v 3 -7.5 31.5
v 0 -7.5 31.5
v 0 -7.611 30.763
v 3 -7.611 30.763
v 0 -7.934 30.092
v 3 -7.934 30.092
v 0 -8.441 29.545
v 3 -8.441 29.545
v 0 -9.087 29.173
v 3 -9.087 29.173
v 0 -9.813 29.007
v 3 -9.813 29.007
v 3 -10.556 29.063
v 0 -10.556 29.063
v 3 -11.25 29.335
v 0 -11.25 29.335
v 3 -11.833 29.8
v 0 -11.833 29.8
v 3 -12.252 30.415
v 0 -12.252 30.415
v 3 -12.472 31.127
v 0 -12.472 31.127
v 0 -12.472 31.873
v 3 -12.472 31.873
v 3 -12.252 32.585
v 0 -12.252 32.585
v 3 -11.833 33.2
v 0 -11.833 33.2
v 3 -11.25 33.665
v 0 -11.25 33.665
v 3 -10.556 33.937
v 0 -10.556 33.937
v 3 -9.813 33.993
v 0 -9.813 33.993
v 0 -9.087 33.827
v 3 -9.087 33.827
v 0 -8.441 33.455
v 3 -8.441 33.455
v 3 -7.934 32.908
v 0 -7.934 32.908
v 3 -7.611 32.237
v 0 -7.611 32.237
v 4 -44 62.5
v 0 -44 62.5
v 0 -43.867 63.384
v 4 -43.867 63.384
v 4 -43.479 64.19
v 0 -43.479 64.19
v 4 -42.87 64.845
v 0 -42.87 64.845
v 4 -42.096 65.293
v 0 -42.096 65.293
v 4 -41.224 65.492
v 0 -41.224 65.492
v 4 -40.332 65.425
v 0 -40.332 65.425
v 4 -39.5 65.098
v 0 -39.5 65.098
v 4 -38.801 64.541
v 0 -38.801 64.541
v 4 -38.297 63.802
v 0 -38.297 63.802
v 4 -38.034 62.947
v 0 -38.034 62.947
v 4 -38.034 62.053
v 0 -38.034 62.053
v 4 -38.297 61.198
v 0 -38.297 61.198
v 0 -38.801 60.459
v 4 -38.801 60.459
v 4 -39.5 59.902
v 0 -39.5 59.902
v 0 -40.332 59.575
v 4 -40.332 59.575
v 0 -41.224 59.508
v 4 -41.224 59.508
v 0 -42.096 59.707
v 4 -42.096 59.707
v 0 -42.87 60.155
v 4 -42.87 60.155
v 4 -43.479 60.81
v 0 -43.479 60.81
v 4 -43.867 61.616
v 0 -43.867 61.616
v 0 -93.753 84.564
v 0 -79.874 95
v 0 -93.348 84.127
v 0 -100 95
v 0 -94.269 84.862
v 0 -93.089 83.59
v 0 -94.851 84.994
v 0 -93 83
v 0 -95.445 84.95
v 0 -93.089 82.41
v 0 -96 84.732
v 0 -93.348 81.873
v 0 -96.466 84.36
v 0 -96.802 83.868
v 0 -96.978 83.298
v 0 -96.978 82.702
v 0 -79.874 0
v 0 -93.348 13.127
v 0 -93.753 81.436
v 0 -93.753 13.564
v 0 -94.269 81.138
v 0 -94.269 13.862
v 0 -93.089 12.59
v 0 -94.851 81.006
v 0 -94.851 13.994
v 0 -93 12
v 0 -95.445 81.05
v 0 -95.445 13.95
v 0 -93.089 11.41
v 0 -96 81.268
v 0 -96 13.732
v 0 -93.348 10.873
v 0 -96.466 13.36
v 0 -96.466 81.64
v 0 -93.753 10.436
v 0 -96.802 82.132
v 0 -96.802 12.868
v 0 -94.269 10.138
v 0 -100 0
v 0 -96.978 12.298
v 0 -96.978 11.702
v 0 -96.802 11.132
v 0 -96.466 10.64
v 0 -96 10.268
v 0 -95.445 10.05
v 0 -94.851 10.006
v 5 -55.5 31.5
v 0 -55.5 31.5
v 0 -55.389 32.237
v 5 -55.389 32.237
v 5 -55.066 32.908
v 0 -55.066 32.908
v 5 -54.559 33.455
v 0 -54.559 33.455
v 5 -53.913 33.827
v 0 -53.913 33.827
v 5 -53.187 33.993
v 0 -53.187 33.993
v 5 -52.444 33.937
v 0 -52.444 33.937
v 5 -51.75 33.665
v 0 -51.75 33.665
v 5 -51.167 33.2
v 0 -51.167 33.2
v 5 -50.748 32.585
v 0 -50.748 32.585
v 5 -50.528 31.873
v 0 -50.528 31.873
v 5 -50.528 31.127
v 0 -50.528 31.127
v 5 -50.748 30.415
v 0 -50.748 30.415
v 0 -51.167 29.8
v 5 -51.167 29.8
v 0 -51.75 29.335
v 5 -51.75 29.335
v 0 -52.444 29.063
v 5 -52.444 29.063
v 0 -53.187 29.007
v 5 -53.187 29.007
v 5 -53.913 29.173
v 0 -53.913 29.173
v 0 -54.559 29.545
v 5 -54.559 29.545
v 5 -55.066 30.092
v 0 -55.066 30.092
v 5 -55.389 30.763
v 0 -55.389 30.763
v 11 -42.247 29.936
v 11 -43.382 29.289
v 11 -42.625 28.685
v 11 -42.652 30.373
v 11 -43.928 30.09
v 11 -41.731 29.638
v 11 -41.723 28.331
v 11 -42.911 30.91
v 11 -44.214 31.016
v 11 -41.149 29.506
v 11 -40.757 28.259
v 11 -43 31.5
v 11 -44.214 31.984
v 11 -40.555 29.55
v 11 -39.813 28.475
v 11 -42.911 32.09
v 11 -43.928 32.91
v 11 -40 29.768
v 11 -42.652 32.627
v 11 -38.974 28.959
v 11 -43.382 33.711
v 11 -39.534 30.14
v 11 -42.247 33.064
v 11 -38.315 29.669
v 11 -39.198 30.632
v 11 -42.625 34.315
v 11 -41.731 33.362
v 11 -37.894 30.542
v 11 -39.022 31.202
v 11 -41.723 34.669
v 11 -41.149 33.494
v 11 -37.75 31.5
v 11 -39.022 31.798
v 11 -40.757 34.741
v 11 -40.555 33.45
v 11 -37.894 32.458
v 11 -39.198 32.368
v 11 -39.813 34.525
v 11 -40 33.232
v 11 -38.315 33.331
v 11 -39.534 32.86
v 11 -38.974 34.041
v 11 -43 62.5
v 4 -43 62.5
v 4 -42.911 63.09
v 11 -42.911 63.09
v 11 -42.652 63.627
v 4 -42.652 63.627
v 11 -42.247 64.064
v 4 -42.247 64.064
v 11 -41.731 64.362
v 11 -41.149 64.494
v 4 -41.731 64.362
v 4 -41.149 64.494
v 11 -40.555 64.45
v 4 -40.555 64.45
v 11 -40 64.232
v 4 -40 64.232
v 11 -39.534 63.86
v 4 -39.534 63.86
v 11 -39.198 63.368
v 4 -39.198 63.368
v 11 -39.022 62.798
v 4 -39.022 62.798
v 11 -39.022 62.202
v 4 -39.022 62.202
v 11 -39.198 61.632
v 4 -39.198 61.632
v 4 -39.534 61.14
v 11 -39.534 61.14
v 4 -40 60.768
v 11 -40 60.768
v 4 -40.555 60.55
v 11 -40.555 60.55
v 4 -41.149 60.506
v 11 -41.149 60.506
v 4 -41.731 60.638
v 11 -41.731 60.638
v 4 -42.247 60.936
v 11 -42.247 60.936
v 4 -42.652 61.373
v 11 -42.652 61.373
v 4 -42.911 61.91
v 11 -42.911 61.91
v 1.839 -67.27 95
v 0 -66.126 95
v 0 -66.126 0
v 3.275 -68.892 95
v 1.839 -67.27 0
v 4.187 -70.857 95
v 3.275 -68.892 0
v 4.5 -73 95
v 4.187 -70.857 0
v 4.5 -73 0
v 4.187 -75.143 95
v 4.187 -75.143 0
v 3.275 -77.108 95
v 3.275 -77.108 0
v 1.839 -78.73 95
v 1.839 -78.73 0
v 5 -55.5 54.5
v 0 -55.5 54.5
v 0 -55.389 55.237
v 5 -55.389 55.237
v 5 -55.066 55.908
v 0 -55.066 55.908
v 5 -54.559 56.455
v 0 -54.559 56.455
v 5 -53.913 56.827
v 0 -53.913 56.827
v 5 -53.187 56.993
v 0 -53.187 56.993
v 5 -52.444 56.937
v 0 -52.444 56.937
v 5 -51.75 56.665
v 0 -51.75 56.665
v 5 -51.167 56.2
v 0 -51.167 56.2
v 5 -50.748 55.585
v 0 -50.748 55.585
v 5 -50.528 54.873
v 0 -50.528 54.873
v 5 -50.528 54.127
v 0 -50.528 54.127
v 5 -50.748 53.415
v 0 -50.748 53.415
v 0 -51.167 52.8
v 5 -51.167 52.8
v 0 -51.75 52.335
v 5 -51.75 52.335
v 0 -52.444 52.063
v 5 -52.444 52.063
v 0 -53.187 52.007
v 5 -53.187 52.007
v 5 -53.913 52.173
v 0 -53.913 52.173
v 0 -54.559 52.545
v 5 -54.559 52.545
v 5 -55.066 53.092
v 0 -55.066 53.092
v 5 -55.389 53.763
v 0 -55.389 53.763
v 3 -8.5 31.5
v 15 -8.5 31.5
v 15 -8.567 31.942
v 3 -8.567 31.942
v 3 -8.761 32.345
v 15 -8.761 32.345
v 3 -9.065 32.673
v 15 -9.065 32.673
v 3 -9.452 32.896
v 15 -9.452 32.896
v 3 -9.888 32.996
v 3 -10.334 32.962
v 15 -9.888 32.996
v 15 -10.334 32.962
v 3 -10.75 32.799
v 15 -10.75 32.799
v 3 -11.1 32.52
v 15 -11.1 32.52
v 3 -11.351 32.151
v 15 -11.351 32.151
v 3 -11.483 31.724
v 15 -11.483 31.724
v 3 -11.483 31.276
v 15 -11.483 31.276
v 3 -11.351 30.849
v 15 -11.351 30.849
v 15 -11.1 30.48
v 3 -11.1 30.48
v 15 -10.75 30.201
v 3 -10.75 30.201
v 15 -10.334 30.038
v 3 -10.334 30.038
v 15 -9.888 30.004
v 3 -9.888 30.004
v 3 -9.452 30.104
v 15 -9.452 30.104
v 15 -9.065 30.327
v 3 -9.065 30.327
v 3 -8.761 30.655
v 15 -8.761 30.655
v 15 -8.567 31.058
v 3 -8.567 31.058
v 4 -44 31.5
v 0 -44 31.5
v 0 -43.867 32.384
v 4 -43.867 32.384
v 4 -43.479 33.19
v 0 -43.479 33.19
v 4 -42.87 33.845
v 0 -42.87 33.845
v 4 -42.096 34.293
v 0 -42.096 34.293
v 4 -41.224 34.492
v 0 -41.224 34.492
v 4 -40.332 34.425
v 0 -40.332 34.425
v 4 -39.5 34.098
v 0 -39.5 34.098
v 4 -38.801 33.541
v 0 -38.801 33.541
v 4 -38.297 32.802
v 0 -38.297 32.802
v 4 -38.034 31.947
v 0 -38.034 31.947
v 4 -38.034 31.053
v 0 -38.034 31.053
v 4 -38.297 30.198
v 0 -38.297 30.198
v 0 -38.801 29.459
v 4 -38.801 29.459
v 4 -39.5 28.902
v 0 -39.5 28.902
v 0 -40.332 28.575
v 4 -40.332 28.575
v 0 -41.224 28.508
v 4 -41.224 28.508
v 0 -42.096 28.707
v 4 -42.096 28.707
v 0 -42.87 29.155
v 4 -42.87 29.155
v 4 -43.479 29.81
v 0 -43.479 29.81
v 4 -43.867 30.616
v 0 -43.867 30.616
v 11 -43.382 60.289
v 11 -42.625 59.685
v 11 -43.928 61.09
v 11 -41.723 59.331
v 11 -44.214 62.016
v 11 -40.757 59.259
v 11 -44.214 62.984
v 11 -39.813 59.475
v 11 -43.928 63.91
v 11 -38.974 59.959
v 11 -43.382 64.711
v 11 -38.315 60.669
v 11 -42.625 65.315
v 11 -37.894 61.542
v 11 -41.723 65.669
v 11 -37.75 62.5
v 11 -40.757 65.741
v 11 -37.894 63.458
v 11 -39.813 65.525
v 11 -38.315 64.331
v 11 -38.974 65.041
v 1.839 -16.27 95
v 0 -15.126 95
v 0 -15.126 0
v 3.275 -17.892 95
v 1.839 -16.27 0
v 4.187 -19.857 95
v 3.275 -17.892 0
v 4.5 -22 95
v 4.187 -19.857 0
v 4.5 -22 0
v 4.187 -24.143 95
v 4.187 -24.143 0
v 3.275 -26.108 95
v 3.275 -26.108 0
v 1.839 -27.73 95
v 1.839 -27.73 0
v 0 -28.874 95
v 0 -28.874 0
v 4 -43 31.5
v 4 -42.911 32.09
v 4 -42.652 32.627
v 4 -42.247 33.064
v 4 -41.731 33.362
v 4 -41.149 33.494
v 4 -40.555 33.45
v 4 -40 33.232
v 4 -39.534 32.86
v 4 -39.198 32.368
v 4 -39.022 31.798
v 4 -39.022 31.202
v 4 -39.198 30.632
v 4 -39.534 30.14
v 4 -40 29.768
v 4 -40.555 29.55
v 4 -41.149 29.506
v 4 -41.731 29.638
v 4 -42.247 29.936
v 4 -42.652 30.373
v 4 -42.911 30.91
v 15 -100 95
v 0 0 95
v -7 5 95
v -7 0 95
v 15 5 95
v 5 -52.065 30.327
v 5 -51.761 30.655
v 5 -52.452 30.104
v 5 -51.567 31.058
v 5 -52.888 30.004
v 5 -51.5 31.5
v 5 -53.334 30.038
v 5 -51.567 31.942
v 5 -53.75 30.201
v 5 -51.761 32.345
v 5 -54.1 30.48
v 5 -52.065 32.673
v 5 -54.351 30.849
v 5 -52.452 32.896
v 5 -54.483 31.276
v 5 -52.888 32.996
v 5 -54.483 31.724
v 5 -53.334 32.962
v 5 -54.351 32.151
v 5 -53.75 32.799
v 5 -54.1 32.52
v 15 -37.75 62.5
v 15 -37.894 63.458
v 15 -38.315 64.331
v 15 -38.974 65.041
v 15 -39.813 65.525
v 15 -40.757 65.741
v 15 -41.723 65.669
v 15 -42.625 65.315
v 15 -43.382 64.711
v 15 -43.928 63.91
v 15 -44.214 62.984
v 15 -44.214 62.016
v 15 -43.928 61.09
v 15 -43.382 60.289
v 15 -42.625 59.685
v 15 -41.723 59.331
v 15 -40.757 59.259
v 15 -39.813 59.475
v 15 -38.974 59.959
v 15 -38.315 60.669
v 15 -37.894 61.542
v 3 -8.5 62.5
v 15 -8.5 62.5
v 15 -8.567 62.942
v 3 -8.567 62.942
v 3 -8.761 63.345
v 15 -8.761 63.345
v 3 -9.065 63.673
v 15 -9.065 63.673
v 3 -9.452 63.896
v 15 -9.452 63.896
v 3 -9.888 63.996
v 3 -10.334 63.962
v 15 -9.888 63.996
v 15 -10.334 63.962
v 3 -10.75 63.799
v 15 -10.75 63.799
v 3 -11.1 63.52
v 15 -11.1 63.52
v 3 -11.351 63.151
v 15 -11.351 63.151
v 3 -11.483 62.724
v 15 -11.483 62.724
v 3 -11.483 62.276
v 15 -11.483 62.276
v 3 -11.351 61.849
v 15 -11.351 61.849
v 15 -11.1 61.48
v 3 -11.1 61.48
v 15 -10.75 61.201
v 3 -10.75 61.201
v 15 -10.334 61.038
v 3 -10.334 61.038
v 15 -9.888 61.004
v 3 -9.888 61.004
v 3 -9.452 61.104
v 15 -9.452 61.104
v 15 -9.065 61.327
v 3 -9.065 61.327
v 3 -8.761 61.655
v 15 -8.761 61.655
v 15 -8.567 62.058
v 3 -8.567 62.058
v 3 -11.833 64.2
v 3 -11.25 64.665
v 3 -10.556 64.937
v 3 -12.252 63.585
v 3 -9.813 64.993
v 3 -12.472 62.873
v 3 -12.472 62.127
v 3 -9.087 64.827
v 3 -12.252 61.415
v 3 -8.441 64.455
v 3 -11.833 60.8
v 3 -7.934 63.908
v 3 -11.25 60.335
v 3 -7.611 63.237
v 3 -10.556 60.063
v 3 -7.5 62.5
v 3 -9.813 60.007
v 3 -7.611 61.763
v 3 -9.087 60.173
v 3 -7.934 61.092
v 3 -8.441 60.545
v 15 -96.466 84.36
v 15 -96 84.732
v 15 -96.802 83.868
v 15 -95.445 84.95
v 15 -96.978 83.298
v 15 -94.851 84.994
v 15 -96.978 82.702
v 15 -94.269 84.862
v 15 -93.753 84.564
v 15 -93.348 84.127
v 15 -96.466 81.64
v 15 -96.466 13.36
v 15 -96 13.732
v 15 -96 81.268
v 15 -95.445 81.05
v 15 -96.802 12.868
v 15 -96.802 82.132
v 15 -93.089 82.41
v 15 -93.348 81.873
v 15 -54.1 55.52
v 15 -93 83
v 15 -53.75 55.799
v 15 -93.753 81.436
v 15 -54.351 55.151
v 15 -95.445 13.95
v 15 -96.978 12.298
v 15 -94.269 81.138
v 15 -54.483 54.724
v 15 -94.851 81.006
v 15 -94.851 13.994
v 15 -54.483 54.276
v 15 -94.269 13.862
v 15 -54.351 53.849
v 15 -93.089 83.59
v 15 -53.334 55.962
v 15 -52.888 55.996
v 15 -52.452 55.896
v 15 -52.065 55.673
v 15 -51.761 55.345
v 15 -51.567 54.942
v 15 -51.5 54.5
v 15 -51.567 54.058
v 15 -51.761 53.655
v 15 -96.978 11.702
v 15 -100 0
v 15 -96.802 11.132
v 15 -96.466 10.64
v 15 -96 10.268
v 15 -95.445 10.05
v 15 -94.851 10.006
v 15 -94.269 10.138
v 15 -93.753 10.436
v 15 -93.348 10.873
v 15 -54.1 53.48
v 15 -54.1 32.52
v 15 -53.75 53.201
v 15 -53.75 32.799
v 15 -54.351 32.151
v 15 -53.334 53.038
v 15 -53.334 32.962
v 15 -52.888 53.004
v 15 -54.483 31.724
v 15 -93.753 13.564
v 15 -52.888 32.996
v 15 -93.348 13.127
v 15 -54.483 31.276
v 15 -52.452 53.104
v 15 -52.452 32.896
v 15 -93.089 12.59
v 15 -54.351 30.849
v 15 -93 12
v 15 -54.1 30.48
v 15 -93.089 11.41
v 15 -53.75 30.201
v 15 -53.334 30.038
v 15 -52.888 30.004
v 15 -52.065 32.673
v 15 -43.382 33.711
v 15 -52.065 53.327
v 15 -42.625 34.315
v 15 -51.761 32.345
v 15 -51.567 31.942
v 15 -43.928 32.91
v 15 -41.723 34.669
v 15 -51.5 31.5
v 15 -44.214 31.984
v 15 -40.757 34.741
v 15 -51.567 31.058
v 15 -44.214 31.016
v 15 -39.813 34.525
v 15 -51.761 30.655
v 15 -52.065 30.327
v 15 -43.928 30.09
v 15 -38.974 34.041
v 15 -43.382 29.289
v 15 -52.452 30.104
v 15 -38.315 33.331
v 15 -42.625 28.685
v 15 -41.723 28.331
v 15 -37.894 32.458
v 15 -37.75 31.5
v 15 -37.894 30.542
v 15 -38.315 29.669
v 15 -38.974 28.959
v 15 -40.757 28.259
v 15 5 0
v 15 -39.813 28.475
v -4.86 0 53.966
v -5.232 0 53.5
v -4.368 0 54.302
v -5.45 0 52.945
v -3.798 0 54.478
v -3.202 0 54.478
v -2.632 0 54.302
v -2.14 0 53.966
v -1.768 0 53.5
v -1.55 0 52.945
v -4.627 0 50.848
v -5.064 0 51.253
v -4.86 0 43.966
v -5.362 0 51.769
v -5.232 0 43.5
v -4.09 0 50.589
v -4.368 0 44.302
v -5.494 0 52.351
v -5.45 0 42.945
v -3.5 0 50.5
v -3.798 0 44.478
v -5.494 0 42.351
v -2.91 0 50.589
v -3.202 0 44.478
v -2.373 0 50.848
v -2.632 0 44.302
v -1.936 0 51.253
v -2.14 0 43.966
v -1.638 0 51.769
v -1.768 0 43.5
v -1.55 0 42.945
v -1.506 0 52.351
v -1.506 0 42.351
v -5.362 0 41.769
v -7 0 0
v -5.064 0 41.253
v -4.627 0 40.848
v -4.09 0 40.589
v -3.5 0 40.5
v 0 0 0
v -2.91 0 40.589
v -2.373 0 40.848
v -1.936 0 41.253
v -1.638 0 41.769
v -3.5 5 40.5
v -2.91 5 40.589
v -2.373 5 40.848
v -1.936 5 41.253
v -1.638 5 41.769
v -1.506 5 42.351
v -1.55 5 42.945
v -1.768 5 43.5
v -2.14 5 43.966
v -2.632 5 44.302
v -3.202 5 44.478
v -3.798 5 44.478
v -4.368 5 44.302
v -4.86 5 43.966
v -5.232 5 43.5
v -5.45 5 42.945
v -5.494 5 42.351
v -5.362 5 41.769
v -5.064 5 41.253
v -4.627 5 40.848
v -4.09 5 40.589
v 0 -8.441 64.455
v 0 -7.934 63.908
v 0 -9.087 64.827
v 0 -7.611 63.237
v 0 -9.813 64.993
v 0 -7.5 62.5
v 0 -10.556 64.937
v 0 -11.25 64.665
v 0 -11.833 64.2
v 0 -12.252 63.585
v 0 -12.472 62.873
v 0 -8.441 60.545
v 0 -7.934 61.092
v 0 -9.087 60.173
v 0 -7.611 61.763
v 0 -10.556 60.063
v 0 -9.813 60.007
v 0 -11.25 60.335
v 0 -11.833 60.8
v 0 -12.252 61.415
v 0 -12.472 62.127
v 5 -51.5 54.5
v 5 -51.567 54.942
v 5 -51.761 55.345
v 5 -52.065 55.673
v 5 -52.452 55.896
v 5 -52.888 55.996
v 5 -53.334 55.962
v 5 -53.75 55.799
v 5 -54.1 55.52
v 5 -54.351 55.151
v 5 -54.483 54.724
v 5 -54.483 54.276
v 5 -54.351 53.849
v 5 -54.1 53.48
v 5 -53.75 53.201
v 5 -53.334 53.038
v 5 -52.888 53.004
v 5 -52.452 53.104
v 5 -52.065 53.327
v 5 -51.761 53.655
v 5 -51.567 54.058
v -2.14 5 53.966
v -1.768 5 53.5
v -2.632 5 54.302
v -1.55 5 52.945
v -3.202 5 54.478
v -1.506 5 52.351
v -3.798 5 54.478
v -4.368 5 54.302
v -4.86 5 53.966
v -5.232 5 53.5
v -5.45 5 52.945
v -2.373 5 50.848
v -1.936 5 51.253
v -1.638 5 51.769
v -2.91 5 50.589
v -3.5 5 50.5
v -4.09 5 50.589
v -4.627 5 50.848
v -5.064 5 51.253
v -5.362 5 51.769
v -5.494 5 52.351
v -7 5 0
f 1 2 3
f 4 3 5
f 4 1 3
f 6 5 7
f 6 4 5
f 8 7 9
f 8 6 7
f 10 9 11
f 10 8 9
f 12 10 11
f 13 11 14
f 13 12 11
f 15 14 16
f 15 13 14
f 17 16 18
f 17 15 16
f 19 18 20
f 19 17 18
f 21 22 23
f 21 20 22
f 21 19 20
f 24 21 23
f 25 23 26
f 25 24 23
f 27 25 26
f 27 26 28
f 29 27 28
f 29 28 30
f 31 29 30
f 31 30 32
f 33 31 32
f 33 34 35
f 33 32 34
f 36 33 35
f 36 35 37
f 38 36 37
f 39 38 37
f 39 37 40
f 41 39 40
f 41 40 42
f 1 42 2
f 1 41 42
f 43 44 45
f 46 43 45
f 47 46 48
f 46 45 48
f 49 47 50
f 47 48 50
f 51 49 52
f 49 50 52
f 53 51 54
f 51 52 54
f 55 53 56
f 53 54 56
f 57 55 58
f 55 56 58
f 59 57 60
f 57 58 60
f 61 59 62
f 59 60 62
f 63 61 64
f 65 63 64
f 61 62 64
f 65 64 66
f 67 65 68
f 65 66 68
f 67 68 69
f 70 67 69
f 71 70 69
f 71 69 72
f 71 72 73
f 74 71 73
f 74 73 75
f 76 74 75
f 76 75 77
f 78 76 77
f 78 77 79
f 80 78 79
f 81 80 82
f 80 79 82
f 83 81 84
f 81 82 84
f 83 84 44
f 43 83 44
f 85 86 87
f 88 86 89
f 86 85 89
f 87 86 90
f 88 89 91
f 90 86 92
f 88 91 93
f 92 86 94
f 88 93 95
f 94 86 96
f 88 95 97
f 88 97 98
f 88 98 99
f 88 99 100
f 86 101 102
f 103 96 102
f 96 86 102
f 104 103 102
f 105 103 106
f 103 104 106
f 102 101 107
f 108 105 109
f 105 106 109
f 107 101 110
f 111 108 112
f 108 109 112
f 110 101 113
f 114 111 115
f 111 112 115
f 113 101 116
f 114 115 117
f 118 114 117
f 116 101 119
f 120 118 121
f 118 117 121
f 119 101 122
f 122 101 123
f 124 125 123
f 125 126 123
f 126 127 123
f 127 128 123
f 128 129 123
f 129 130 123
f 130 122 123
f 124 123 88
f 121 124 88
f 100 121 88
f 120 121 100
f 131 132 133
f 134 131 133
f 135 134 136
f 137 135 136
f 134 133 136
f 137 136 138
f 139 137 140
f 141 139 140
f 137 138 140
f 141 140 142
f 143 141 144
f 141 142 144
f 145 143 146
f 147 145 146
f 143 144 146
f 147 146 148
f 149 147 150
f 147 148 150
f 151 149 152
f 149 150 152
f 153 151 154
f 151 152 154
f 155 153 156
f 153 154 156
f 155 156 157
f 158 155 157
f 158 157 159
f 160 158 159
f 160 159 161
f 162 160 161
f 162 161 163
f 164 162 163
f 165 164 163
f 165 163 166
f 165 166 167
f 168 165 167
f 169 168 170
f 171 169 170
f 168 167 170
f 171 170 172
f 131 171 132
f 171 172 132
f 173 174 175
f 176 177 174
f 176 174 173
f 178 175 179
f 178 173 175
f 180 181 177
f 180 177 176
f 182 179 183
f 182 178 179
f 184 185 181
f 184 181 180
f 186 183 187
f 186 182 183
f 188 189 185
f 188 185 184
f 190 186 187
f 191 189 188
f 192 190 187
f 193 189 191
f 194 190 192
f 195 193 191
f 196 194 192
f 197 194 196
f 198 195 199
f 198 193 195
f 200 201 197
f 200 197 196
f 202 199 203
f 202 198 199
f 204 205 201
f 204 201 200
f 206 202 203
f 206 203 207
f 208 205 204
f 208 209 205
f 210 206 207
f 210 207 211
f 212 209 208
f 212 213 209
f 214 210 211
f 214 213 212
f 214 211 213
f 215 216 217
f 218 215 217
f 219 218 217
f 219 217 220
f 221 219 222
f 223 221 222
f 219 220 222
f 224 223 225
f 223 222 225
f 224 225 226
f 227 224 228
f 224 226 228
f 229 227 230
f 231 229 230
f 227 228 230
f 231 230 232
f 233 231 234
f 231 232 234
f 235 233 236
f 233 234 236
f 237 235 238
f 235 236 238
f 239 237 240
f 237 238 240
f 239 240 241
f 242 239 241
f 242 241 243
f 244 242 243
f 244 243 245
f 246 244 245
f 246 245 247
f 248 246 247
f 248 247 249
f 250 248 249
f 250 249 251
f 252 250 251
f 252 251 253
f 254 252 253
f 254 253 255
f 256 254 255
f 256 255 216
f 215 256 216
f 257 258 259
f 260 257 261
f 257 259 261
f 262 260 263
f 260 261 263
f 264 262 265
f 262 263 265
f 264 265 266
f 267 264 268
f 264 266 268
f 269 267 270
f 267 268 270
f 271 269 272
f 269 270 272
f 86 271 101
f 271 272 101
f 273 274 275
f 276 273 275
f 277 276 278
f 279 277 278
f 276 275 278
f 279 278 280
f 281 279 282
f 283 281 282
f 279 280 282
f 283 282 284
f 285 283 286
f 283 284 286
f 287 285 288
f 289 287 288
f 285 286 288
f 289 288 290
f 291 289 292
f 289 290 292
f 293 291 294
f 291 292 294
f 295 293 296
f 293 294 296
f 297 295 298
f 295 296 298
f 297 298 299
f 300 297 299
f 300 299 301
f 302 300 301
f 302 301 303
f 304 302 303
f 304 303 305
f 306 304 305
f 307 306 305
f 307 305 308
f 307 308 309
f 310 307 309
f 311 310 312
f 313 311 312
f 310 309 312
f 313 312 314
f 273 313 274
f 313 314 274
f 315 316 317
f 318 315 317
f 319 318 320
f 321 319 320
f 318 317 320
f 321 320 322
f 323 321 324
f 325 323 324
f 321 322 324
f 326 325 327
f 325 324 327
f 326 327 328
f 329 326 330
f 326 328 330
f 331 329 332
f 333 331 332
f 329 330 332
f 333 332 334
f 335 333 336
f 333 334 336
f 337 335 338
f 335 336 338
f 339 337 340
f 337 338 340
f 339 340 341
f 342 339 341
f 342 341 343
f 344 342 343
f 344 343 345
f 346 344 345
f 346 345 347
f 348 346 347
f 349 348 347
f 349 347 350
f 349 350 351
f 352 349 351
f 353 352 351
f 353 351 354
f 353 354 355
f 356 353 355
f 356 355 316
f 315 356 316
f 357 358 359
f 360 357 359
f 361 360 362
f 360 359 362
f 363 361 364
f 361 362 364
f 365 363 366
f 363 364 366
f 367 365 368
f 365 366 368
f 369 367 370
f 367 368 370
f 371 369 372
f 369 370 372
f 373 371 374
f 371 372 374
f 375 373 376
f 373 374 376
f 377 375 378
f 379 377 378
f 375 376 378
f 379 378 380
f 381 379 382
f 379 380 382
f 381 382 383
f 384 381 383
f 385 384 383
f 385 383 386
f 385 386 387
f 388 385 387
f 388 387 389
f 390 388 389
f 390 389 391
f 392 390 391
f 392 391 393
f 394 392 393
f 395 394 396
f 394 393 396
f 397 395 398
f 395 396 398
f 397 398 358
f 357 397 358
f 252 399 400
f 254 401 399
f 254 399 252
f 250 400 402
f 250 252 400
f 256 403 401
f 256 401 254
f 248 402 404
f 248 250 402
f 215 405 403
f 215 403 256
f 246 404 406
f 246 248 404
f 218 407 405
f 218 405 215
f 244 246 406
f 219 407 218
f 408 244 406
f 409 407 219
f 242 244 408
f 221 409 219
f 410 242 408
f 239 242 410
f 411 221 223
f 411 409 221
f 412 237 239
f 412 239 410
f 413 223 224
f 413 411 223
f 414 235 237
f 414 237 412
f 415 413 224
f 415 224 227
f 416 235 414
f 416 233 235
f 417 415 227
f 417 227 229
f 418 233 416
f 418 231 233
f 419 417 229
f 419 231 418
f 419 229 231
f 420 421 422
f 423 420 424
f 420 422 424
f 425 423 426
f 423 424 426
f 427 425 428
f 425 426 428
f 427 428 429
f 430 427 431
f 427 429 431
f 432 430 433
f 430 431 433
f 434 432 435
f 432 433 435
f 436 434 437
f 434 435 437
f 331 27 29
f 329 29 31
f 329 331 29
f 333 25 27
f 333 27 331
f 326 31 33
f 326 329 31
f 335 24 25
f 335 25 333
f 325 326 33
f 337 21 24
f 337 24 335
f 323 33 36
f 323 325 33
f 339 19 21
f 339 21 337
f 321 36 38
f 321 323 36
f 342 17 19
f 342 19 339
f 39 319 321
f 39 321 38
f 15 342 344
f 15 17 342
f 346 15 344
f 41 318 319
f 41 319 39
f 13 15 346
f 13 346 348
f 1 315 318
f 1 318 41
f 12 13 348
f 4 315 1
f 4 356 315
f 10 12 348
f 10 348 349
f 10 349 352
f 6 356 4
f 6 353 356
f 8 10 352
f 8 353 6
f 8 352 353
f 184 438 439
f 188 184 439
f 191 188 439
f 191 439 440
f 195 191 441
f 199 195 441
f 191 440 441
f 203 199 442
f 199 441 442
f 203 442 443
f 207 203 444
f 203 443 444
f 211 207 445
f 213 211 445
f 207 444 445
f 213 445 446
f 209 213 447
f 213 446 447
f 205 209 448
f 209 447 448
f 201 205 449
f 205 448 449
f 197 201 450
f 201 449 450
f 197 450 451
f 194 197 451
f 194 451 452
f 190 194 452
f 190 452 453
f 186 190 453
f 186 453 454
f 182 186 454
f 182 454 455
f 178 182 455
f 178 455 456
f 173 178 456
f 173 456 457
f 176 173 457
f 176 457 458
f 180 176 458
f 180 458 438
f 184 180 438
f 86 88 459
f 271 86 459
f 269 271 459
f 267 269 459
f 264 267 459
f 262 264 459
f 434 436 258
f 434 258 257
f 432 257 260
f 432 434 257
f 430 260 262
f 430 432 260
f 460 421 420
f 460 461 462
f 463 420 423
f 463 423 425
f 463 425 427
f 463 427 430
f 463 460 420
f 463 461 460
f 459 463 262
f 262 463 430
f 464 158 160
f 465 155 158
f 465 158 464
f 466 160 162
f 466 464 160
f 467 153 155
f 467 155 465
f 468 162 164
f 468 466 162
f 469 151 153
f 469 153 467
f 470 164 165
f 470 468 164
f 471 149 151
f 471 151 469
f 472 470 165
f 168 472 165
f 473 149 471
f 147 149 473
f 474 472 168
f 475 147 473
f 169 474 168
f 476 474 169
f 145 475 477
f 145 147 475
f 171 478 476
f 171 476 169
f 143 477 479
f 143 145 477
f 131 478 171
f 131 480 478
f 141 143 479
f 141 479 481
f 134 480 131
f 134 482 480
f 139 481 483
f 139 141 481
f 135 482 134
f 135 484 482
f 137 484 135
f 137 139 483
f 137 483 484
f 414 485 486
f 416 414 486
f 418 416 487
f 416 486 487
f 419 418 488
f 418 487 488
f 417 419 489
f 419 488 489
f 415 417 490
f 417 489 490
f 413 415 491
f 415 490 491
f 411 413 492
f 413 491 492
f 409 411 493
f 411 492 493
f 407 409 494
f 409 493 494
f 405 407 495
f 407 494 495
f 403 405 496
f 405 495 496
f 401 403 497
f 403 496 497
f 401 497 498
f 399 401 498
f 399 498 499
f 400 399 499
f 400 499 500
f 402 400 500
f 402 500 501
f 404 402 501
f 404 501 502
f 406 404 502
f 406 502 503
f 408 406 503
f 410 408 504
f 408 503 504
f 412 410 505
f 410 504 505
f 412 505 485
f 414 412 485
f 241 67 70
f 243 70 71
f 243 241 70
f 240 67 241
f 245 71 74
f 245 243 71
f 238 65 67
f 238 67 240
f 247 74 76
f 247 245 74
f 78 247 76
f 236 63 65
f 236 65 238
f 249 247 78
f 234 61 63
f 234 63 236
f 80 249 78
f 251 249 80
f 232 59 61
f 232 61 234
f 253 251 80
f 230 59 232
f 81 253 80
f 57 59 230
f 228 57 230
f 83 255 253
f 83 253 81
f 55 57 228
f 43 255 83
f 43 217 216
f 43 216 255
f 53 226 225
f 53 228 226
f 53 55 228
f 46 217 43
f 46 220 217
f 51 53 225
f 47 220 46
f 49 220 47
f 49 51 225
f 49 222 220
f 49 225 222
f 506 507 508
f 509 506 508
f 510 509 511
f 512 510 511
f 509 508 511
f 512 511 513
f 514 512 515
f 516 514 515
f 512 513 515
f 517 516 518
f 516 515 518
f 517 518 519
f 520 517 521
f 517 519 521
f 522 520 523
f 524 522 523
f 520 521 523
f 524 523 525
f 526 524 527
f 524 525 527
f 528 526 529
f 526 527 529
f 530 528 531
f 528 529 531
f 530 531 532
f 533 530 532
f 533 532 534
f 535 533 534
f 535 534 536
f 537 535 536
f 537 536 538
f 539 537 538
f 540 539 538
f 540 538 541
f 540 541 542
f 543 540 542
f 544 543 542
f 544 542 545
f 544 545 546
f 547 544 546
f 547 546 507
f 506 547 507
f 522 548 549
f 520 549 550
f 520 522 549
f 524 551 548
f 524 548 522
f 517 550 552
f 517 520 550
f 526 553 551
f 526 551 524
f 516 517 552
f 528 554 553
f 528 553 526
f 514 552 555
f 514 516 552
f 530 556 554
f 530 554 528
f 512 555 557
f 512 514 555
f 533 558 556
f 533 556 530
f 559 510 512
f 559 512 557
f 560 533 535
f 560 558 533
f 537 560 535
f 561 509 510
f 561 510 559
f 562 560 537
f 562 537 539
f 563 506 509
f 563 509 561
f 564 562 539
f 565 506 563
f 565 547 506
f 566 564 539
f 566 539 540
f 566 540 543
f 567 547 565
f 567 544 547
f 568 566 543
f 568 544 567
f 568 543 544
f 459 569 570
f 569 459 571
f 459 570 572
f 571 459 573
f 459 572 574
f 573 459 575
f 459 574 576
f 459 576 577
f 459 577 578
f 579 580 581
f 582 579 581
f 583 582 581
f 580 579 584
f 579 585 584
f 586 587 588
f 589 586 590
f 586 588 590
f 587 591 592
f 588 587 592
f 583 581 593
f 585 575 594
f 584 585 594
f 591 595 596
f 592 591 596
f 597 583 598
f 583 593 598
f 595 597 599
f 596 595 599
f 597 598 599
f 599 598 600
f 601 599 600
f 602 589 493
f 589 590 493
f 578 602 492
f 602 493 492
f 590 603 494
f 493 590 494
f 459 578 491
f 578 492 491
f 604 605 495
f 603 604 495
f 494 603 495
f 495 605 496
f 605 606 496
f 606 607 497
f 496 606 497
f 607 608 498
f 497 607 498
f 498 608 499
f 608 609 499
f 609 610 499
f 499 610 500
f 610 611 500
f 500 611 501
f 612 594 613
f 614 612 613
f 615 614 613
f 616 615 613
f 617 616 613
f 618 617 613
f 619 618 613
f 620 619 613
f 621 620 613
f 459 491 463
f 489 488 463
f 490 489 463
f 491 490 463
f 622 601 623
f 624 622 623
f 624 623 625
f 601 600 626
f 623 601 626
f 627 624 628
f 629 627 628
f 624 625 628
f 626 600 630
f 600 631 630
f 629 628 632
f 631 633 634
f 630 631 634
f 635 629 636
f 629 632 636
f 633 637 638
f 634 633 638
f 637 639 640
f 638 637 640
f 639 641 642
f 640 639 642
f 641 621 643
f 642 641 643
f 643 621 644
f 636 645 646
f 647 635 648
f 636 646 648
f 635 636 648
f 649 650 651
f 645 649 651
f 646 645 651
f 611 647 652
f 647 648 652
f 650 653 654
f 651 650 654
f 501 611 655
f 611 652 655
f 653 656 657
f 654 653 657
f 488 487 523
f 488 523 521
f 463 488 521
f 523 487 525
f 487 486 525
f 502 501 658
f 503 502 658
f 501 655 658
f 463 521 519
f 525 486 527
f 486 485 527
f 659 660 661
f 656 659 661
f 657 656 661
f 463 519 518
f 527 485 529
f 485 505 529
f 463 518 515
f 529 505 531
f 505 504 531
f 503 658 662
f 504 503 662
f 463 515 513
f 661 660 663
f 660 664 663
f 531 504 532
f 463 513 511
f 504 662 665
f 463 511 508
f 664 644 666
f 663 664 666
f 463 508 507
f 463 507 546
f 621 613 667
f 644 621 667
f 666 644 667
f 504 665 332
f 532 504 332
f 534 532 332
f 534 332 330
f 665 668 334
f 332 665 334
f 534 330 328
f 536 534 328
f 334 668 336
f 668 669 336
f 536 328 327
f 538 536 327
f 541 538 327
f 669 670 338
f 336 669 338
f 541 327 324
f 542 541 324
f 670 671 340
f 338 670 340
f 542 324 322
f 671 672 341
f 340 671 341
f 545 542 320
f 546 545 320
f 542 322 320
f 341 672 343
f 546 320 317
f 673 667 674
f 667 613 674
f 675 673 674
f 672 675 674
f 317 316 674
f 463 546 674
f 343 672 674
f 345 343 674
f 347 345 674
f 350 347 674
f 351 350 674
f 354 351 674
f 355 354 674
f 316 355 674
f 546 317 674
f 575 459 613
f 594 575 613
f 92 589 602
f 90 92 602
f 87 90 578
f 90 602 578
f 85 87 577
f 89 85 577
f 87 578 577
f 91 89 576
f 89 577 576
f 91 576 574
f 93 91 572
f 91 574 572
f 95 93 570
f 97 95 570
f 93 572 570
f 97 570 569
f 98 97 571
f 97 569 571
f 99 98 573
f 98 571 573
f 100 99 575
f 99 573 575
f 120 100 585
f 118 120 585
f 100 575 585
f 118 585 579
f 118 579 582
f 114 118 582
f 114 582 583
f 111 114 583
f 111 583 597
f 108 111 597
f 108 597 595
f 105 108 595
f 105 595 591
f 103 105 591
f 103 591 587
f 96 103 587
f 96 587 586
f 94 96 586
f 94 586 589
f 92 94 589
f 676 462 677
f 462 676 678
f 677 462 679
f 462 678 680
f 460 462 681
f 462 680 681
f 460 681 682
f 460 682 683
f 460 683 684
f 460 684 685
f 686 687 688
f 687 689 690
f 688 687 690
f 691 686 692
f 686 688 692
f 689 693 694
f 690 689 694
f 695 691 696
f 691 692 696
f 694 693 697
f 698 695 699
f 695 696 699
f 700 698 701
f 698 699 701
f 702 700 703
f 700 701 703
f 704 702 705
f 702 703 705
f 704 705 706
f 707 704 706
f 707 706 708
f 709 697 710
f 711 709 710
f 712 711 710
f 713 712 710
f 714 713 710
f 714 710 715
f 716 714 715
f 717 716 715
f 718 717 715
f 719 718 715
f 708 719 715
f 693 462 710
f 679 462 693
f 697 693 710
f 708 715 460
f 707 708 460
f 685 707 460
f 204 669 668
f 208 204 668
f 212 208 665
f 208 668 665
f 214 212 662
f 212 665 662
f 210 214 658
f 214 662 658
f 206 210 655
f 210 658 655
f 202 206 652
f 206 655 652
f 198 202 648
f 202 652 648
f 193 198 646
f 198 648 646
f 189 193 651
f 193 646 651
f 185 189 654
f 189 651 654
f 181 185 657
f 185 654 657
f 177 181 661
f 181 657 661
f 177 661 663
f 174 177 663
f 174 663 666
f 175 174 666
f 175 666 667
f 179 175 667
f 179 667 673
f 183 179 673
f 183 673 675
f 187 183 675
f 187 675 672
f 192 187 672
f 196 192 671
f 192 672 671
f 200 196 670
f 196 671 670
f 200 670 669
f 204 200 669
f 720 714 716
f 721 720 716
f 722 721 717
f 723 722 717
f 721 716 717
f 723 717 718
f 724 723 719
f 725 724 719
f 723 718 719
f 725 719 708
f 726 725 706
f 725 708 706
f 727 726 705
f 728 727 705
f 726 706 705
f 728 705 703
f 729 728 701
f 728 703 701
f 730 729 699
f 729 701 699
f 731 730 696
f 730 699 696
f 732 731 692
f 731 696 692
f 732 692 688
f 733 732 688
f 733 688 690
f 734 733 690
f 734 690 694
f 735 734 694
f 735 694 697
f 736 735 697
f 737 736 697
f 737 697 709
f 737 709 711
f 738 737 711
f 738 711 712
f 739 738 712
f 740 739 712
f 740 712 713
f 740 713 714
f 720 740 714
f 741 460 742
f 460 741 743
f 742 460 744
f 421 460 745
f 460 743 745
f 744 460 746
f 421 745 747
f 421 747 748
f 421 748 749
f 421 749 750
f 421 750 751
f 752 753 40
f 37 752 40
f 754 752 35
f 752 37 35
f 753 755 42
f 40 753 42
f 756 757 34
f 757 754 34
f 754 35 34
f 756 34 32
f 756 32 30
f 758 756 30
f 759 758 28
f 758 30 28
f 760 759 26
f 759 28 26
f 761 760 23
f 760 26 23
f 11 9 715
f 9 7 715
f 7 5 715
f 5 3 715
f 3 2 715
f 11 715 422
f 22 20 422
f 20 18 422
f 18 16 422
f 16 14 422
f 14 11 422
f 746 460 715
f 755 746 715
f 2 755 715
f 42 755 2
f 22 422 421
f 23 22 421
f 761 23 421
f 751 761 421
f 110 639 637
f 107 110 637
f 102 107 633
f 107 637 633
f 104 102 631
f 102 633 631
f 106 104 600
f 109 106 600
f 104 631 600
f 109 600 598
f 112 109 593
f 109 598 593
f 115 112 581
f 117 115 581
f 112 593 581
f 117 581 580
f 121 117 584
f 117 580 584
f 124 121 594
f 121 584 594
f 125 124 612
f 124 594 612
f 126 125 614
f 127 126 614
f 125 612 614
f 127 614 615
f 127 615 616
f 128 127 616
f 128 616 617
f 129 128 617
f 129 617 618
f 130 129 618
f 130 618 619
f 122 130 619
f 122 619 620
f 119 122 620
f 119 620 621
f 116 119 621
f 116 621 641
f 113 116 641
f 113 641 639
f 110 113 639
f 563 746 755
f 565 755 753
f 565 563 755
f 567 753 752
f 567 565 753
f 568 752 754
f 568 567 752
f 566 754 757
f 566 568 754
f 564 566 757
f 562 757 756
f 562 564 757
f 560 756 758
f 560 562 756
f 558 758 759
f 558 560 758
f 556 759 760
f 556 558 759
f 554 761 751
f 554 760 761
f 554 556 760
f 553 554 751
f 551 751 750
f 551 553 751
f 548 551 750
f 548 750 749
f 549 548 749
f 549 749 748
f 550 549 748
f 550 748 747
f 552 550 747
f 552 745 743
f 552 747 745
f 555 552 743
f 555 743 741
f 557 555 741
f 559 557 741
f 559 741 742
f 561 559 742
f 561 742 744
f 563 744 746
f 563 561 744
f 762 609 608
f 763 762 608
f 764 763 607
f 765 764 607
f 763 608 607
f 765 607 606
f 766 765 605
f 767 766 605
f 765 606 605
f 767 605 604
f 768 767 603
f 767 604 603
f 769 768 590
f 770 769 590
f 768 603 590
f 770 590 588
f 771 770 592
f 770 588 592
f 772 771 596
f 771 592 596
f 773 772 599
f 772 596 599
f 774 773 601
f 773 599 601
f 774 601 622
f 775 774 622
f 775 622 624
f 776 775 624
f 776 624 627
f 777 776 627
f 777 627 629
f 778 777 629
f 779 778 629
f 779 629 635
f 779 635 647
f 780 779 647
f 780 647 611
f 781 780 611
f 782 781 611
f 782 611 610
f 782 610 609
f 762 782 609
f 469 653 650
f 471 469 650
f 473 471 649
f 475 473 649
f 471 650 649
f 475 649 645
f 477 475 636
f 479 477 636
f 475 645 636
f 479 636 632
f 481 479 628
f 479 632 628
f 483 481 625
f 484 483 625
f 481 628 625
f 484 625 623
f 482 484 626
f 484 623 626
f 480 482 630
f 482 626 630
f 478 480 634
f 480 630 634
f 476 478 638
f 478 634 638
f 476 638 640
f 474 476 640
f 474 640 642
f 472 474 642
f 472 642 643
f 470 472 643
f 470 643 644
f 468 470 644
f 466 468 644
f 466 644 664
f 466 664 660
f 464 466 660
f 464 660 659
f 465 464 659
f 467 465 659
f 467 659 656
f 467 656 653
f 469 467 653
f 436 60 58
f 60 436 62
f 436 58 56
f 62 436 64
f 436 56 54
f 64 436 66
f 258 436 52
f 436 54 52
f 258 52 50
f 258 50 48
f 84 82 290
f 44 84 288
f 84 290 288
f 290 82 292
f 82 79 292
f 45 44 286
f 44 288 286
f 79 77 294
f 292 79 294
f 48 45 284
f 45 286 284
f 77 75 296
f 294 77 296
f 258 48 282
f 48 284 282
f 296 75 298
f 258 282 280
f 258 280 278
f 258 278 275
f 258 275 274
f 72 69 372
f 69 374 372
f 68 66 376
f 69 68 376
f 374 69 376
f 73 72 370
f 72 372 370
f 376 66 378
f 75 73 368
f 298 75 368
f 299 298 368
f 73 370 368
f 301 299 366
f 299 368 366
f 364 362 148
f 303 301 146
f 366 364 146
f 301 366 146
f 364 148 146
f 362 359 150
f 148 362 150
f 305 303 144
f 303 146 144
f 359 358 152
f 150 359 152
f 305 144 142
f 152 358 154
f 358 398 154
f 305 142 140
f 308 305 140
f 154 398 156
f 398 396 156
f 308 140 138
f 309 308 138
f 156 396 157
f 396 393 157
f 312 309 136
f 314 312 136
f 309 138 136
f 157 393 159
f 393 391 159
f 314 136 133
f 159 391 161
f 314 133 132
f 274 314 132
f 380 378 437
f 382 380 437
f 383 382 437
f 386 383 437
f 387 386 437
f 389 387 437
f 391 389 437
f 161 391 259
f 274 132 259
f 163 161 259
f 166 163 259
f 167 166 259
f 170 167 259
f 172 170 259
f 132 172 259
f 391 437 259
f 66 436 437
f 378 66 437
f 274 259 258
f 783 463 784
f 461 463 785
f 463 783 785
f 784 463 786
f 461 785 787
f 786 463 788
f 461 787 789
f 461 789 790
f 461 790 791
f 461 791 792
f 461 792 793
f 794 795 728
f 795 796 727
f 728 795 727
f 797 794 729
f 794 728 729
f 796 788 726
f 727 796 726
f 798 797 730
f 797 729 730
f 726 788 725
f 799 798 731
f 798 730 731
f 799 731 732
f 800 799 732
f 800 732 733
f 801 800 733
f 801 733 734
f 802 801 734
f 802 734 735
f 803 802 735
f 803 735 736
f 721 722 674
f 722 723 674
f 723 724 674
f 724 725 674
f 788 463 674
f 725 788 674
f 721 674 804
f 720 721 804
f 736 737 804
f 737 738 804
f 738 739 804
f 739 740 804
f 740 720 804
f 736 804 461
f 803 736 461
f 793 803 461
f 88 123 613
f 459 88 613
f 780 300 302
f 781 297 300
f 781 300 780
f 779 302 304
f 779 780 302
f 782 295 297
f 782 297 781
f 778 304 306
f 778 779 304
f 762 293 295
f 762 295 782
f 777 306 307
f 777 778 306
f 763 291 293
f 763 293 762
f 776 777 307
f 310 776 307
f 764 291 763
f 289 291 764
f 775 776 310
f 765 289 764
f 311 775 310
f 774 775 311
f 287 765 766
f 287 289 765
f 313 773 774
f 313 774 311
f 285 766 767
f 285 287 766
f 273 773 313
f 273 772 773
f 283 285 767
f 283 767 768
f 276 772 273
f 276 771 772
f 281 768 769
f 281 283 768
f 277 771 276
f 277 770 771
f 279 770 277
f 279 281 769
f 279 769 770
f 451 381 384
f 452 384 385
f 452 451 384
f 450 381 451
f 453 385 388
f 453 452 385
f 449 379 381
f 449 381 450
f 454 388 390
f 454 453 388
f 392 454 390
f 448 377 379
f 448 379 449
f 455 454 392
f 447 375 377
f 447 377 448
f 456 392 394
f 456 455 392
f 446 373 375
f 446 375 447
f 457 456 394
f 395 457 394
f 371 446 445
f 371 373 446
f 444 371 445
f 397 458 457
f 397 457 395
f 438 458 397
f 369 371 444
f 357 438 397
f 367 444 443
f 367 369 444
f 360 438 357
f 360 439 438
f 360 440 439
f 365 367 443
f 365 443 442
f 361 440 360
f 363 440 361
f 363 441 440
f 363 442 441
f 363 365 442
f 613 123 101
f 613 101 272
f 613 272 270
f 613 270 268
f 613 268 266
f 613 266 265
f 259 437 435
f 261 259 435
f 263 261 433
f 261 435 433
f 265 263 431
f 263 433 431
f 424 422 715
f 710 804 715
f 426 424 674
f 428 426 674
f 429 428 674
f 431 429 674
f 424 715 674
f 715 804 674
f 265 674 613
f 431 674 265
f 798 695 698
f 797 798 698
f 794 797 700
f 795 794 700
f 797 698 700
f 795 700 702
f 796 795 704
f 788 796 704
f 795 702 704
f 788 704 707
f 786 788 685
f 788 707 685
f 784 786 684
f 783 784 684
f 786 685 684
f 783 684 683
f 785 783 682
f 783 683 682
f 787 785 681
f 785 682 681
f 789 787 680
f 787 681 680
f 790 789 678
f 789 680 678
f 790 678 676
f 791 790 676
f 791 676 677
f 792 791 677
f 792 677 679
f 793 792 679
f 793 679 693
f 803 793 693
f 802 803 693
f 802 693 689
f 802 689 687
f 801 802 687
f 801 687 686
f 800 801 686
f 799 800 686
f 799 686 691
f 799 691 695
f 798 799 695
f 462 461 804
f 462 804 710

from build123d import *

# Parameters (mm, degrees)
BOSS_EXTRUDE1_DEPTH                = 95
SKETCH2_R                          = 2
CUT_EXTRUDE1_3DPRINTER4_DEPTH      = 139.744369255
ESQUISSE1_R                        = 1.5
ENL_V_MAT_EXTRU_1_3D_PRINTER_DEPTH = 140.67462189
ENL_V_MAT_EXTRU_2_DEPTH            = 139.744369255
ENL_V_MAT_EXTRU_2_DEPTH_BACK       = 3
ESQUISSE2_R                        = 2.5
ESQUISSE3_R                        = 3.25
ENL_V_MAT_EXTRU_3_DEPTH            = 4
ESQUISSE4_R                        = 2
ENL_V_MAT_EXTRU_4_DEPTH            = 140.67462189
ESQUISSE8_R                        = 7.5
ENL_V_MAT_EXTRU_9_DEPTH            = 139.744369255
ESQUISSE10_R                       = 2
ENL_V_MAT_EXTRU_10_DEPTH           = 139.744369255
ESQUISSE11_R                       = 2.5
ENL_V_MAT_EXTRU_11_DEPTH           = 5
ESQUISSE12_R                       = 3
ENL_V_MAT_EXTRU_12_DEPTH           = 4


with BuildPart() as part:
    # Sketch1 → Boss-Extrude1 (new body)
    with BuildSketch(Plane.XY):
        Polygon((0, 0), (0, -37.75), (0, -100), (15, -100), (15, 5), (-7, 5), (-7, 0), align=None)
    extrude(amount=BOSS_EXTRUDE1_DEPTH)

    # Sketch2 → Cut-Extrude1 3dprinter4 (cut, through all)
    with BuildSketch(Plane.ZY):
        with Locations(Location((62.5, -41, 0), (0, 0, 270))):
            Circle(SKETCH2_R)
        with Locations(Location((31.5, -41, 0), (0, 0, 270))):
            Circle(SKETCH2_R)
    extrude(amount=-CUT_EXTRUDE1_3DPRINTER4_DEPTH, mode=Mode.SUBTRACT)

    # Esquisse1 → Enlèv. mat.-Extru.1 3d printer (cut, through all)
    with BuildSketch(Plane(origin=(15, 0, 0), x_dir=(0, 0, -1), z_dir=(1, 0, 0))):
        with Locations(Location((-62.5, -10, 0), (0, 0, 90))):
            Circle(ESQUISSE1_R)
        with Locations(Location((-31.5, -10, 0), (0, 0, 90))):
            Circle(ESQUISSE1_R)
        with Locations(Location((-54.5, -53, 0), (0, 0, 90))):
            Circle(ESQUISSE1_R)
        with Locations(Location((-31.5, -53, 0), (0, 0, 90))):
            Circle(ESQUISSE1_R)
    extrude(amount=-ENL_V_MAT_EXTRU_1_3D_PRINTER_DEPTH, mode=Mode.SUBTRACT)

    # Esquisse2 → Enlèv. mat.-Extru.2 (cut, two sides: drawn at the far end of the back side and taken through both)
    with BuildSketch(Plane.ZY.offset(-ENL_V_MAT_EXTRU_2_DEPTH_BACK)):
        with Locations(Location((62.5, -10, 0), (0, 0, 90))):
            Circle(ESQUISSE2_R)
        with Locations(Location((31.5, -10, 0), (0, 0, 90))):
            Circle(ESQUISSE2_R)
    extrude(amount=ENL_V_MAT_EXTRU_2_DEPTH + ENL_V_MAT_EXTRU_2_DEPTH_BACK, mode=Mode.SUBTRACT)

    # Esquisse3 → Enlèv. mat.-Extru.3 (cut)
    with BuildSketch(Plane(origin=(15, 0, 0), x_dir=(0, 0, -1), z_dir=(1, 0, 0))):
        with Locations(Location((-31.5, -41, 0), (0, 0, 90))):
            Circle(ESQUISSE3_R)
        with Locations(Location((-62.5, -41, 0), (0, 0, 90))):
            Circle(ESQUISSE3_R)
    extrude(amount=-ENL_V_MAT_EXTRU_3_DEPTH, mode=Mode.SUBTRACT)

    # Esquisse4 → Enlèv. mat.-Extru.4 (cut, through all)
    with BuildSketch(Plane(origin=(15, 0, 0), x_dir=(0, 0, -1), z_dir=(1, 0, 0))):
        with Locations(Location((-83, -95, 0), (0, 0, 90))):
            Circle(ESQUISSE4_R)
        with Locations(Location((-12, -95, 0), (0, 0, 90))):
            Circle(ESQUISSE4_R)
    extrude(amount=-ENL_V_MAT_EXTRU_4_DEPTH, mode=Mode.SUBTRACT)

    # Esquisse8 → Enlèv. mat.-Extru.9 (cut, through all)
    with BuildSketch(Plane(origin=(0, 0, 0), x_dir=(-1, 0, 0), z_dir=(0, 0, -1))):
        with Locations((3, -22)):
            Circle(ESQUISSE8_R)
        with Locations((3, -73)):
            Circle(ESQUISSE8_R)
    extrude(amount=-ENL_V_MAT_EXTRU_9_DEPTH, mode=Mode.SUBTRACT)

    # Esquisse10 → Enlèv. mat.-Extru.10 (cut, through all)
    with BuildSketch(Plane.XZ):
        with Locations(Location((-3.5, 52.5, 0), (0, 0, 270))):
            Circle(ESQUISSE10_R)
        with Locations(Location((-3.5, 42.5, 0), (0, 0, 270))):
            Circle(ESQUISSE10_R)
    extrude(amount=-ENL_V_MAT_EXTRU_10_DEPTH, mode=Mode.SUBTRACT)

    # Esquisse11 → Enlèv. mat.-Extru.11 (cut)
    with BuildSketch(Plane.ZY):
        with Locations(Location((54.5, -53, 0), (0, 0, 270))):
            Circle(ESQUISSE11_R)
        with Locations(Location((31.5, -53, 0), (0, 0, 270))):
            Circle(ESQUISSE11_R)
    extrude(amount=-ENL_V_MAT_EXTRU_11_DEPTH, mode=Mode.SUBTRACT)

    # Esquisse12 → Enlèv. mat.-Extru.12 (cut)
    with BuildSketch(Plane.ZY):
        with Locations(Location((62.5, -41, 0), (0, 0, 270))):
            Circle(ESQUISSE12_R)
        with Locations(Location((31.5, -41, 0), (0, 0, 270))):
            Circle(ESQUISSE12_R)
    extrude(amount=-ENL_V_MAT_EXTRU_12_DEPTH, mode=Mode.SUBTRACT)


solid = part.part
